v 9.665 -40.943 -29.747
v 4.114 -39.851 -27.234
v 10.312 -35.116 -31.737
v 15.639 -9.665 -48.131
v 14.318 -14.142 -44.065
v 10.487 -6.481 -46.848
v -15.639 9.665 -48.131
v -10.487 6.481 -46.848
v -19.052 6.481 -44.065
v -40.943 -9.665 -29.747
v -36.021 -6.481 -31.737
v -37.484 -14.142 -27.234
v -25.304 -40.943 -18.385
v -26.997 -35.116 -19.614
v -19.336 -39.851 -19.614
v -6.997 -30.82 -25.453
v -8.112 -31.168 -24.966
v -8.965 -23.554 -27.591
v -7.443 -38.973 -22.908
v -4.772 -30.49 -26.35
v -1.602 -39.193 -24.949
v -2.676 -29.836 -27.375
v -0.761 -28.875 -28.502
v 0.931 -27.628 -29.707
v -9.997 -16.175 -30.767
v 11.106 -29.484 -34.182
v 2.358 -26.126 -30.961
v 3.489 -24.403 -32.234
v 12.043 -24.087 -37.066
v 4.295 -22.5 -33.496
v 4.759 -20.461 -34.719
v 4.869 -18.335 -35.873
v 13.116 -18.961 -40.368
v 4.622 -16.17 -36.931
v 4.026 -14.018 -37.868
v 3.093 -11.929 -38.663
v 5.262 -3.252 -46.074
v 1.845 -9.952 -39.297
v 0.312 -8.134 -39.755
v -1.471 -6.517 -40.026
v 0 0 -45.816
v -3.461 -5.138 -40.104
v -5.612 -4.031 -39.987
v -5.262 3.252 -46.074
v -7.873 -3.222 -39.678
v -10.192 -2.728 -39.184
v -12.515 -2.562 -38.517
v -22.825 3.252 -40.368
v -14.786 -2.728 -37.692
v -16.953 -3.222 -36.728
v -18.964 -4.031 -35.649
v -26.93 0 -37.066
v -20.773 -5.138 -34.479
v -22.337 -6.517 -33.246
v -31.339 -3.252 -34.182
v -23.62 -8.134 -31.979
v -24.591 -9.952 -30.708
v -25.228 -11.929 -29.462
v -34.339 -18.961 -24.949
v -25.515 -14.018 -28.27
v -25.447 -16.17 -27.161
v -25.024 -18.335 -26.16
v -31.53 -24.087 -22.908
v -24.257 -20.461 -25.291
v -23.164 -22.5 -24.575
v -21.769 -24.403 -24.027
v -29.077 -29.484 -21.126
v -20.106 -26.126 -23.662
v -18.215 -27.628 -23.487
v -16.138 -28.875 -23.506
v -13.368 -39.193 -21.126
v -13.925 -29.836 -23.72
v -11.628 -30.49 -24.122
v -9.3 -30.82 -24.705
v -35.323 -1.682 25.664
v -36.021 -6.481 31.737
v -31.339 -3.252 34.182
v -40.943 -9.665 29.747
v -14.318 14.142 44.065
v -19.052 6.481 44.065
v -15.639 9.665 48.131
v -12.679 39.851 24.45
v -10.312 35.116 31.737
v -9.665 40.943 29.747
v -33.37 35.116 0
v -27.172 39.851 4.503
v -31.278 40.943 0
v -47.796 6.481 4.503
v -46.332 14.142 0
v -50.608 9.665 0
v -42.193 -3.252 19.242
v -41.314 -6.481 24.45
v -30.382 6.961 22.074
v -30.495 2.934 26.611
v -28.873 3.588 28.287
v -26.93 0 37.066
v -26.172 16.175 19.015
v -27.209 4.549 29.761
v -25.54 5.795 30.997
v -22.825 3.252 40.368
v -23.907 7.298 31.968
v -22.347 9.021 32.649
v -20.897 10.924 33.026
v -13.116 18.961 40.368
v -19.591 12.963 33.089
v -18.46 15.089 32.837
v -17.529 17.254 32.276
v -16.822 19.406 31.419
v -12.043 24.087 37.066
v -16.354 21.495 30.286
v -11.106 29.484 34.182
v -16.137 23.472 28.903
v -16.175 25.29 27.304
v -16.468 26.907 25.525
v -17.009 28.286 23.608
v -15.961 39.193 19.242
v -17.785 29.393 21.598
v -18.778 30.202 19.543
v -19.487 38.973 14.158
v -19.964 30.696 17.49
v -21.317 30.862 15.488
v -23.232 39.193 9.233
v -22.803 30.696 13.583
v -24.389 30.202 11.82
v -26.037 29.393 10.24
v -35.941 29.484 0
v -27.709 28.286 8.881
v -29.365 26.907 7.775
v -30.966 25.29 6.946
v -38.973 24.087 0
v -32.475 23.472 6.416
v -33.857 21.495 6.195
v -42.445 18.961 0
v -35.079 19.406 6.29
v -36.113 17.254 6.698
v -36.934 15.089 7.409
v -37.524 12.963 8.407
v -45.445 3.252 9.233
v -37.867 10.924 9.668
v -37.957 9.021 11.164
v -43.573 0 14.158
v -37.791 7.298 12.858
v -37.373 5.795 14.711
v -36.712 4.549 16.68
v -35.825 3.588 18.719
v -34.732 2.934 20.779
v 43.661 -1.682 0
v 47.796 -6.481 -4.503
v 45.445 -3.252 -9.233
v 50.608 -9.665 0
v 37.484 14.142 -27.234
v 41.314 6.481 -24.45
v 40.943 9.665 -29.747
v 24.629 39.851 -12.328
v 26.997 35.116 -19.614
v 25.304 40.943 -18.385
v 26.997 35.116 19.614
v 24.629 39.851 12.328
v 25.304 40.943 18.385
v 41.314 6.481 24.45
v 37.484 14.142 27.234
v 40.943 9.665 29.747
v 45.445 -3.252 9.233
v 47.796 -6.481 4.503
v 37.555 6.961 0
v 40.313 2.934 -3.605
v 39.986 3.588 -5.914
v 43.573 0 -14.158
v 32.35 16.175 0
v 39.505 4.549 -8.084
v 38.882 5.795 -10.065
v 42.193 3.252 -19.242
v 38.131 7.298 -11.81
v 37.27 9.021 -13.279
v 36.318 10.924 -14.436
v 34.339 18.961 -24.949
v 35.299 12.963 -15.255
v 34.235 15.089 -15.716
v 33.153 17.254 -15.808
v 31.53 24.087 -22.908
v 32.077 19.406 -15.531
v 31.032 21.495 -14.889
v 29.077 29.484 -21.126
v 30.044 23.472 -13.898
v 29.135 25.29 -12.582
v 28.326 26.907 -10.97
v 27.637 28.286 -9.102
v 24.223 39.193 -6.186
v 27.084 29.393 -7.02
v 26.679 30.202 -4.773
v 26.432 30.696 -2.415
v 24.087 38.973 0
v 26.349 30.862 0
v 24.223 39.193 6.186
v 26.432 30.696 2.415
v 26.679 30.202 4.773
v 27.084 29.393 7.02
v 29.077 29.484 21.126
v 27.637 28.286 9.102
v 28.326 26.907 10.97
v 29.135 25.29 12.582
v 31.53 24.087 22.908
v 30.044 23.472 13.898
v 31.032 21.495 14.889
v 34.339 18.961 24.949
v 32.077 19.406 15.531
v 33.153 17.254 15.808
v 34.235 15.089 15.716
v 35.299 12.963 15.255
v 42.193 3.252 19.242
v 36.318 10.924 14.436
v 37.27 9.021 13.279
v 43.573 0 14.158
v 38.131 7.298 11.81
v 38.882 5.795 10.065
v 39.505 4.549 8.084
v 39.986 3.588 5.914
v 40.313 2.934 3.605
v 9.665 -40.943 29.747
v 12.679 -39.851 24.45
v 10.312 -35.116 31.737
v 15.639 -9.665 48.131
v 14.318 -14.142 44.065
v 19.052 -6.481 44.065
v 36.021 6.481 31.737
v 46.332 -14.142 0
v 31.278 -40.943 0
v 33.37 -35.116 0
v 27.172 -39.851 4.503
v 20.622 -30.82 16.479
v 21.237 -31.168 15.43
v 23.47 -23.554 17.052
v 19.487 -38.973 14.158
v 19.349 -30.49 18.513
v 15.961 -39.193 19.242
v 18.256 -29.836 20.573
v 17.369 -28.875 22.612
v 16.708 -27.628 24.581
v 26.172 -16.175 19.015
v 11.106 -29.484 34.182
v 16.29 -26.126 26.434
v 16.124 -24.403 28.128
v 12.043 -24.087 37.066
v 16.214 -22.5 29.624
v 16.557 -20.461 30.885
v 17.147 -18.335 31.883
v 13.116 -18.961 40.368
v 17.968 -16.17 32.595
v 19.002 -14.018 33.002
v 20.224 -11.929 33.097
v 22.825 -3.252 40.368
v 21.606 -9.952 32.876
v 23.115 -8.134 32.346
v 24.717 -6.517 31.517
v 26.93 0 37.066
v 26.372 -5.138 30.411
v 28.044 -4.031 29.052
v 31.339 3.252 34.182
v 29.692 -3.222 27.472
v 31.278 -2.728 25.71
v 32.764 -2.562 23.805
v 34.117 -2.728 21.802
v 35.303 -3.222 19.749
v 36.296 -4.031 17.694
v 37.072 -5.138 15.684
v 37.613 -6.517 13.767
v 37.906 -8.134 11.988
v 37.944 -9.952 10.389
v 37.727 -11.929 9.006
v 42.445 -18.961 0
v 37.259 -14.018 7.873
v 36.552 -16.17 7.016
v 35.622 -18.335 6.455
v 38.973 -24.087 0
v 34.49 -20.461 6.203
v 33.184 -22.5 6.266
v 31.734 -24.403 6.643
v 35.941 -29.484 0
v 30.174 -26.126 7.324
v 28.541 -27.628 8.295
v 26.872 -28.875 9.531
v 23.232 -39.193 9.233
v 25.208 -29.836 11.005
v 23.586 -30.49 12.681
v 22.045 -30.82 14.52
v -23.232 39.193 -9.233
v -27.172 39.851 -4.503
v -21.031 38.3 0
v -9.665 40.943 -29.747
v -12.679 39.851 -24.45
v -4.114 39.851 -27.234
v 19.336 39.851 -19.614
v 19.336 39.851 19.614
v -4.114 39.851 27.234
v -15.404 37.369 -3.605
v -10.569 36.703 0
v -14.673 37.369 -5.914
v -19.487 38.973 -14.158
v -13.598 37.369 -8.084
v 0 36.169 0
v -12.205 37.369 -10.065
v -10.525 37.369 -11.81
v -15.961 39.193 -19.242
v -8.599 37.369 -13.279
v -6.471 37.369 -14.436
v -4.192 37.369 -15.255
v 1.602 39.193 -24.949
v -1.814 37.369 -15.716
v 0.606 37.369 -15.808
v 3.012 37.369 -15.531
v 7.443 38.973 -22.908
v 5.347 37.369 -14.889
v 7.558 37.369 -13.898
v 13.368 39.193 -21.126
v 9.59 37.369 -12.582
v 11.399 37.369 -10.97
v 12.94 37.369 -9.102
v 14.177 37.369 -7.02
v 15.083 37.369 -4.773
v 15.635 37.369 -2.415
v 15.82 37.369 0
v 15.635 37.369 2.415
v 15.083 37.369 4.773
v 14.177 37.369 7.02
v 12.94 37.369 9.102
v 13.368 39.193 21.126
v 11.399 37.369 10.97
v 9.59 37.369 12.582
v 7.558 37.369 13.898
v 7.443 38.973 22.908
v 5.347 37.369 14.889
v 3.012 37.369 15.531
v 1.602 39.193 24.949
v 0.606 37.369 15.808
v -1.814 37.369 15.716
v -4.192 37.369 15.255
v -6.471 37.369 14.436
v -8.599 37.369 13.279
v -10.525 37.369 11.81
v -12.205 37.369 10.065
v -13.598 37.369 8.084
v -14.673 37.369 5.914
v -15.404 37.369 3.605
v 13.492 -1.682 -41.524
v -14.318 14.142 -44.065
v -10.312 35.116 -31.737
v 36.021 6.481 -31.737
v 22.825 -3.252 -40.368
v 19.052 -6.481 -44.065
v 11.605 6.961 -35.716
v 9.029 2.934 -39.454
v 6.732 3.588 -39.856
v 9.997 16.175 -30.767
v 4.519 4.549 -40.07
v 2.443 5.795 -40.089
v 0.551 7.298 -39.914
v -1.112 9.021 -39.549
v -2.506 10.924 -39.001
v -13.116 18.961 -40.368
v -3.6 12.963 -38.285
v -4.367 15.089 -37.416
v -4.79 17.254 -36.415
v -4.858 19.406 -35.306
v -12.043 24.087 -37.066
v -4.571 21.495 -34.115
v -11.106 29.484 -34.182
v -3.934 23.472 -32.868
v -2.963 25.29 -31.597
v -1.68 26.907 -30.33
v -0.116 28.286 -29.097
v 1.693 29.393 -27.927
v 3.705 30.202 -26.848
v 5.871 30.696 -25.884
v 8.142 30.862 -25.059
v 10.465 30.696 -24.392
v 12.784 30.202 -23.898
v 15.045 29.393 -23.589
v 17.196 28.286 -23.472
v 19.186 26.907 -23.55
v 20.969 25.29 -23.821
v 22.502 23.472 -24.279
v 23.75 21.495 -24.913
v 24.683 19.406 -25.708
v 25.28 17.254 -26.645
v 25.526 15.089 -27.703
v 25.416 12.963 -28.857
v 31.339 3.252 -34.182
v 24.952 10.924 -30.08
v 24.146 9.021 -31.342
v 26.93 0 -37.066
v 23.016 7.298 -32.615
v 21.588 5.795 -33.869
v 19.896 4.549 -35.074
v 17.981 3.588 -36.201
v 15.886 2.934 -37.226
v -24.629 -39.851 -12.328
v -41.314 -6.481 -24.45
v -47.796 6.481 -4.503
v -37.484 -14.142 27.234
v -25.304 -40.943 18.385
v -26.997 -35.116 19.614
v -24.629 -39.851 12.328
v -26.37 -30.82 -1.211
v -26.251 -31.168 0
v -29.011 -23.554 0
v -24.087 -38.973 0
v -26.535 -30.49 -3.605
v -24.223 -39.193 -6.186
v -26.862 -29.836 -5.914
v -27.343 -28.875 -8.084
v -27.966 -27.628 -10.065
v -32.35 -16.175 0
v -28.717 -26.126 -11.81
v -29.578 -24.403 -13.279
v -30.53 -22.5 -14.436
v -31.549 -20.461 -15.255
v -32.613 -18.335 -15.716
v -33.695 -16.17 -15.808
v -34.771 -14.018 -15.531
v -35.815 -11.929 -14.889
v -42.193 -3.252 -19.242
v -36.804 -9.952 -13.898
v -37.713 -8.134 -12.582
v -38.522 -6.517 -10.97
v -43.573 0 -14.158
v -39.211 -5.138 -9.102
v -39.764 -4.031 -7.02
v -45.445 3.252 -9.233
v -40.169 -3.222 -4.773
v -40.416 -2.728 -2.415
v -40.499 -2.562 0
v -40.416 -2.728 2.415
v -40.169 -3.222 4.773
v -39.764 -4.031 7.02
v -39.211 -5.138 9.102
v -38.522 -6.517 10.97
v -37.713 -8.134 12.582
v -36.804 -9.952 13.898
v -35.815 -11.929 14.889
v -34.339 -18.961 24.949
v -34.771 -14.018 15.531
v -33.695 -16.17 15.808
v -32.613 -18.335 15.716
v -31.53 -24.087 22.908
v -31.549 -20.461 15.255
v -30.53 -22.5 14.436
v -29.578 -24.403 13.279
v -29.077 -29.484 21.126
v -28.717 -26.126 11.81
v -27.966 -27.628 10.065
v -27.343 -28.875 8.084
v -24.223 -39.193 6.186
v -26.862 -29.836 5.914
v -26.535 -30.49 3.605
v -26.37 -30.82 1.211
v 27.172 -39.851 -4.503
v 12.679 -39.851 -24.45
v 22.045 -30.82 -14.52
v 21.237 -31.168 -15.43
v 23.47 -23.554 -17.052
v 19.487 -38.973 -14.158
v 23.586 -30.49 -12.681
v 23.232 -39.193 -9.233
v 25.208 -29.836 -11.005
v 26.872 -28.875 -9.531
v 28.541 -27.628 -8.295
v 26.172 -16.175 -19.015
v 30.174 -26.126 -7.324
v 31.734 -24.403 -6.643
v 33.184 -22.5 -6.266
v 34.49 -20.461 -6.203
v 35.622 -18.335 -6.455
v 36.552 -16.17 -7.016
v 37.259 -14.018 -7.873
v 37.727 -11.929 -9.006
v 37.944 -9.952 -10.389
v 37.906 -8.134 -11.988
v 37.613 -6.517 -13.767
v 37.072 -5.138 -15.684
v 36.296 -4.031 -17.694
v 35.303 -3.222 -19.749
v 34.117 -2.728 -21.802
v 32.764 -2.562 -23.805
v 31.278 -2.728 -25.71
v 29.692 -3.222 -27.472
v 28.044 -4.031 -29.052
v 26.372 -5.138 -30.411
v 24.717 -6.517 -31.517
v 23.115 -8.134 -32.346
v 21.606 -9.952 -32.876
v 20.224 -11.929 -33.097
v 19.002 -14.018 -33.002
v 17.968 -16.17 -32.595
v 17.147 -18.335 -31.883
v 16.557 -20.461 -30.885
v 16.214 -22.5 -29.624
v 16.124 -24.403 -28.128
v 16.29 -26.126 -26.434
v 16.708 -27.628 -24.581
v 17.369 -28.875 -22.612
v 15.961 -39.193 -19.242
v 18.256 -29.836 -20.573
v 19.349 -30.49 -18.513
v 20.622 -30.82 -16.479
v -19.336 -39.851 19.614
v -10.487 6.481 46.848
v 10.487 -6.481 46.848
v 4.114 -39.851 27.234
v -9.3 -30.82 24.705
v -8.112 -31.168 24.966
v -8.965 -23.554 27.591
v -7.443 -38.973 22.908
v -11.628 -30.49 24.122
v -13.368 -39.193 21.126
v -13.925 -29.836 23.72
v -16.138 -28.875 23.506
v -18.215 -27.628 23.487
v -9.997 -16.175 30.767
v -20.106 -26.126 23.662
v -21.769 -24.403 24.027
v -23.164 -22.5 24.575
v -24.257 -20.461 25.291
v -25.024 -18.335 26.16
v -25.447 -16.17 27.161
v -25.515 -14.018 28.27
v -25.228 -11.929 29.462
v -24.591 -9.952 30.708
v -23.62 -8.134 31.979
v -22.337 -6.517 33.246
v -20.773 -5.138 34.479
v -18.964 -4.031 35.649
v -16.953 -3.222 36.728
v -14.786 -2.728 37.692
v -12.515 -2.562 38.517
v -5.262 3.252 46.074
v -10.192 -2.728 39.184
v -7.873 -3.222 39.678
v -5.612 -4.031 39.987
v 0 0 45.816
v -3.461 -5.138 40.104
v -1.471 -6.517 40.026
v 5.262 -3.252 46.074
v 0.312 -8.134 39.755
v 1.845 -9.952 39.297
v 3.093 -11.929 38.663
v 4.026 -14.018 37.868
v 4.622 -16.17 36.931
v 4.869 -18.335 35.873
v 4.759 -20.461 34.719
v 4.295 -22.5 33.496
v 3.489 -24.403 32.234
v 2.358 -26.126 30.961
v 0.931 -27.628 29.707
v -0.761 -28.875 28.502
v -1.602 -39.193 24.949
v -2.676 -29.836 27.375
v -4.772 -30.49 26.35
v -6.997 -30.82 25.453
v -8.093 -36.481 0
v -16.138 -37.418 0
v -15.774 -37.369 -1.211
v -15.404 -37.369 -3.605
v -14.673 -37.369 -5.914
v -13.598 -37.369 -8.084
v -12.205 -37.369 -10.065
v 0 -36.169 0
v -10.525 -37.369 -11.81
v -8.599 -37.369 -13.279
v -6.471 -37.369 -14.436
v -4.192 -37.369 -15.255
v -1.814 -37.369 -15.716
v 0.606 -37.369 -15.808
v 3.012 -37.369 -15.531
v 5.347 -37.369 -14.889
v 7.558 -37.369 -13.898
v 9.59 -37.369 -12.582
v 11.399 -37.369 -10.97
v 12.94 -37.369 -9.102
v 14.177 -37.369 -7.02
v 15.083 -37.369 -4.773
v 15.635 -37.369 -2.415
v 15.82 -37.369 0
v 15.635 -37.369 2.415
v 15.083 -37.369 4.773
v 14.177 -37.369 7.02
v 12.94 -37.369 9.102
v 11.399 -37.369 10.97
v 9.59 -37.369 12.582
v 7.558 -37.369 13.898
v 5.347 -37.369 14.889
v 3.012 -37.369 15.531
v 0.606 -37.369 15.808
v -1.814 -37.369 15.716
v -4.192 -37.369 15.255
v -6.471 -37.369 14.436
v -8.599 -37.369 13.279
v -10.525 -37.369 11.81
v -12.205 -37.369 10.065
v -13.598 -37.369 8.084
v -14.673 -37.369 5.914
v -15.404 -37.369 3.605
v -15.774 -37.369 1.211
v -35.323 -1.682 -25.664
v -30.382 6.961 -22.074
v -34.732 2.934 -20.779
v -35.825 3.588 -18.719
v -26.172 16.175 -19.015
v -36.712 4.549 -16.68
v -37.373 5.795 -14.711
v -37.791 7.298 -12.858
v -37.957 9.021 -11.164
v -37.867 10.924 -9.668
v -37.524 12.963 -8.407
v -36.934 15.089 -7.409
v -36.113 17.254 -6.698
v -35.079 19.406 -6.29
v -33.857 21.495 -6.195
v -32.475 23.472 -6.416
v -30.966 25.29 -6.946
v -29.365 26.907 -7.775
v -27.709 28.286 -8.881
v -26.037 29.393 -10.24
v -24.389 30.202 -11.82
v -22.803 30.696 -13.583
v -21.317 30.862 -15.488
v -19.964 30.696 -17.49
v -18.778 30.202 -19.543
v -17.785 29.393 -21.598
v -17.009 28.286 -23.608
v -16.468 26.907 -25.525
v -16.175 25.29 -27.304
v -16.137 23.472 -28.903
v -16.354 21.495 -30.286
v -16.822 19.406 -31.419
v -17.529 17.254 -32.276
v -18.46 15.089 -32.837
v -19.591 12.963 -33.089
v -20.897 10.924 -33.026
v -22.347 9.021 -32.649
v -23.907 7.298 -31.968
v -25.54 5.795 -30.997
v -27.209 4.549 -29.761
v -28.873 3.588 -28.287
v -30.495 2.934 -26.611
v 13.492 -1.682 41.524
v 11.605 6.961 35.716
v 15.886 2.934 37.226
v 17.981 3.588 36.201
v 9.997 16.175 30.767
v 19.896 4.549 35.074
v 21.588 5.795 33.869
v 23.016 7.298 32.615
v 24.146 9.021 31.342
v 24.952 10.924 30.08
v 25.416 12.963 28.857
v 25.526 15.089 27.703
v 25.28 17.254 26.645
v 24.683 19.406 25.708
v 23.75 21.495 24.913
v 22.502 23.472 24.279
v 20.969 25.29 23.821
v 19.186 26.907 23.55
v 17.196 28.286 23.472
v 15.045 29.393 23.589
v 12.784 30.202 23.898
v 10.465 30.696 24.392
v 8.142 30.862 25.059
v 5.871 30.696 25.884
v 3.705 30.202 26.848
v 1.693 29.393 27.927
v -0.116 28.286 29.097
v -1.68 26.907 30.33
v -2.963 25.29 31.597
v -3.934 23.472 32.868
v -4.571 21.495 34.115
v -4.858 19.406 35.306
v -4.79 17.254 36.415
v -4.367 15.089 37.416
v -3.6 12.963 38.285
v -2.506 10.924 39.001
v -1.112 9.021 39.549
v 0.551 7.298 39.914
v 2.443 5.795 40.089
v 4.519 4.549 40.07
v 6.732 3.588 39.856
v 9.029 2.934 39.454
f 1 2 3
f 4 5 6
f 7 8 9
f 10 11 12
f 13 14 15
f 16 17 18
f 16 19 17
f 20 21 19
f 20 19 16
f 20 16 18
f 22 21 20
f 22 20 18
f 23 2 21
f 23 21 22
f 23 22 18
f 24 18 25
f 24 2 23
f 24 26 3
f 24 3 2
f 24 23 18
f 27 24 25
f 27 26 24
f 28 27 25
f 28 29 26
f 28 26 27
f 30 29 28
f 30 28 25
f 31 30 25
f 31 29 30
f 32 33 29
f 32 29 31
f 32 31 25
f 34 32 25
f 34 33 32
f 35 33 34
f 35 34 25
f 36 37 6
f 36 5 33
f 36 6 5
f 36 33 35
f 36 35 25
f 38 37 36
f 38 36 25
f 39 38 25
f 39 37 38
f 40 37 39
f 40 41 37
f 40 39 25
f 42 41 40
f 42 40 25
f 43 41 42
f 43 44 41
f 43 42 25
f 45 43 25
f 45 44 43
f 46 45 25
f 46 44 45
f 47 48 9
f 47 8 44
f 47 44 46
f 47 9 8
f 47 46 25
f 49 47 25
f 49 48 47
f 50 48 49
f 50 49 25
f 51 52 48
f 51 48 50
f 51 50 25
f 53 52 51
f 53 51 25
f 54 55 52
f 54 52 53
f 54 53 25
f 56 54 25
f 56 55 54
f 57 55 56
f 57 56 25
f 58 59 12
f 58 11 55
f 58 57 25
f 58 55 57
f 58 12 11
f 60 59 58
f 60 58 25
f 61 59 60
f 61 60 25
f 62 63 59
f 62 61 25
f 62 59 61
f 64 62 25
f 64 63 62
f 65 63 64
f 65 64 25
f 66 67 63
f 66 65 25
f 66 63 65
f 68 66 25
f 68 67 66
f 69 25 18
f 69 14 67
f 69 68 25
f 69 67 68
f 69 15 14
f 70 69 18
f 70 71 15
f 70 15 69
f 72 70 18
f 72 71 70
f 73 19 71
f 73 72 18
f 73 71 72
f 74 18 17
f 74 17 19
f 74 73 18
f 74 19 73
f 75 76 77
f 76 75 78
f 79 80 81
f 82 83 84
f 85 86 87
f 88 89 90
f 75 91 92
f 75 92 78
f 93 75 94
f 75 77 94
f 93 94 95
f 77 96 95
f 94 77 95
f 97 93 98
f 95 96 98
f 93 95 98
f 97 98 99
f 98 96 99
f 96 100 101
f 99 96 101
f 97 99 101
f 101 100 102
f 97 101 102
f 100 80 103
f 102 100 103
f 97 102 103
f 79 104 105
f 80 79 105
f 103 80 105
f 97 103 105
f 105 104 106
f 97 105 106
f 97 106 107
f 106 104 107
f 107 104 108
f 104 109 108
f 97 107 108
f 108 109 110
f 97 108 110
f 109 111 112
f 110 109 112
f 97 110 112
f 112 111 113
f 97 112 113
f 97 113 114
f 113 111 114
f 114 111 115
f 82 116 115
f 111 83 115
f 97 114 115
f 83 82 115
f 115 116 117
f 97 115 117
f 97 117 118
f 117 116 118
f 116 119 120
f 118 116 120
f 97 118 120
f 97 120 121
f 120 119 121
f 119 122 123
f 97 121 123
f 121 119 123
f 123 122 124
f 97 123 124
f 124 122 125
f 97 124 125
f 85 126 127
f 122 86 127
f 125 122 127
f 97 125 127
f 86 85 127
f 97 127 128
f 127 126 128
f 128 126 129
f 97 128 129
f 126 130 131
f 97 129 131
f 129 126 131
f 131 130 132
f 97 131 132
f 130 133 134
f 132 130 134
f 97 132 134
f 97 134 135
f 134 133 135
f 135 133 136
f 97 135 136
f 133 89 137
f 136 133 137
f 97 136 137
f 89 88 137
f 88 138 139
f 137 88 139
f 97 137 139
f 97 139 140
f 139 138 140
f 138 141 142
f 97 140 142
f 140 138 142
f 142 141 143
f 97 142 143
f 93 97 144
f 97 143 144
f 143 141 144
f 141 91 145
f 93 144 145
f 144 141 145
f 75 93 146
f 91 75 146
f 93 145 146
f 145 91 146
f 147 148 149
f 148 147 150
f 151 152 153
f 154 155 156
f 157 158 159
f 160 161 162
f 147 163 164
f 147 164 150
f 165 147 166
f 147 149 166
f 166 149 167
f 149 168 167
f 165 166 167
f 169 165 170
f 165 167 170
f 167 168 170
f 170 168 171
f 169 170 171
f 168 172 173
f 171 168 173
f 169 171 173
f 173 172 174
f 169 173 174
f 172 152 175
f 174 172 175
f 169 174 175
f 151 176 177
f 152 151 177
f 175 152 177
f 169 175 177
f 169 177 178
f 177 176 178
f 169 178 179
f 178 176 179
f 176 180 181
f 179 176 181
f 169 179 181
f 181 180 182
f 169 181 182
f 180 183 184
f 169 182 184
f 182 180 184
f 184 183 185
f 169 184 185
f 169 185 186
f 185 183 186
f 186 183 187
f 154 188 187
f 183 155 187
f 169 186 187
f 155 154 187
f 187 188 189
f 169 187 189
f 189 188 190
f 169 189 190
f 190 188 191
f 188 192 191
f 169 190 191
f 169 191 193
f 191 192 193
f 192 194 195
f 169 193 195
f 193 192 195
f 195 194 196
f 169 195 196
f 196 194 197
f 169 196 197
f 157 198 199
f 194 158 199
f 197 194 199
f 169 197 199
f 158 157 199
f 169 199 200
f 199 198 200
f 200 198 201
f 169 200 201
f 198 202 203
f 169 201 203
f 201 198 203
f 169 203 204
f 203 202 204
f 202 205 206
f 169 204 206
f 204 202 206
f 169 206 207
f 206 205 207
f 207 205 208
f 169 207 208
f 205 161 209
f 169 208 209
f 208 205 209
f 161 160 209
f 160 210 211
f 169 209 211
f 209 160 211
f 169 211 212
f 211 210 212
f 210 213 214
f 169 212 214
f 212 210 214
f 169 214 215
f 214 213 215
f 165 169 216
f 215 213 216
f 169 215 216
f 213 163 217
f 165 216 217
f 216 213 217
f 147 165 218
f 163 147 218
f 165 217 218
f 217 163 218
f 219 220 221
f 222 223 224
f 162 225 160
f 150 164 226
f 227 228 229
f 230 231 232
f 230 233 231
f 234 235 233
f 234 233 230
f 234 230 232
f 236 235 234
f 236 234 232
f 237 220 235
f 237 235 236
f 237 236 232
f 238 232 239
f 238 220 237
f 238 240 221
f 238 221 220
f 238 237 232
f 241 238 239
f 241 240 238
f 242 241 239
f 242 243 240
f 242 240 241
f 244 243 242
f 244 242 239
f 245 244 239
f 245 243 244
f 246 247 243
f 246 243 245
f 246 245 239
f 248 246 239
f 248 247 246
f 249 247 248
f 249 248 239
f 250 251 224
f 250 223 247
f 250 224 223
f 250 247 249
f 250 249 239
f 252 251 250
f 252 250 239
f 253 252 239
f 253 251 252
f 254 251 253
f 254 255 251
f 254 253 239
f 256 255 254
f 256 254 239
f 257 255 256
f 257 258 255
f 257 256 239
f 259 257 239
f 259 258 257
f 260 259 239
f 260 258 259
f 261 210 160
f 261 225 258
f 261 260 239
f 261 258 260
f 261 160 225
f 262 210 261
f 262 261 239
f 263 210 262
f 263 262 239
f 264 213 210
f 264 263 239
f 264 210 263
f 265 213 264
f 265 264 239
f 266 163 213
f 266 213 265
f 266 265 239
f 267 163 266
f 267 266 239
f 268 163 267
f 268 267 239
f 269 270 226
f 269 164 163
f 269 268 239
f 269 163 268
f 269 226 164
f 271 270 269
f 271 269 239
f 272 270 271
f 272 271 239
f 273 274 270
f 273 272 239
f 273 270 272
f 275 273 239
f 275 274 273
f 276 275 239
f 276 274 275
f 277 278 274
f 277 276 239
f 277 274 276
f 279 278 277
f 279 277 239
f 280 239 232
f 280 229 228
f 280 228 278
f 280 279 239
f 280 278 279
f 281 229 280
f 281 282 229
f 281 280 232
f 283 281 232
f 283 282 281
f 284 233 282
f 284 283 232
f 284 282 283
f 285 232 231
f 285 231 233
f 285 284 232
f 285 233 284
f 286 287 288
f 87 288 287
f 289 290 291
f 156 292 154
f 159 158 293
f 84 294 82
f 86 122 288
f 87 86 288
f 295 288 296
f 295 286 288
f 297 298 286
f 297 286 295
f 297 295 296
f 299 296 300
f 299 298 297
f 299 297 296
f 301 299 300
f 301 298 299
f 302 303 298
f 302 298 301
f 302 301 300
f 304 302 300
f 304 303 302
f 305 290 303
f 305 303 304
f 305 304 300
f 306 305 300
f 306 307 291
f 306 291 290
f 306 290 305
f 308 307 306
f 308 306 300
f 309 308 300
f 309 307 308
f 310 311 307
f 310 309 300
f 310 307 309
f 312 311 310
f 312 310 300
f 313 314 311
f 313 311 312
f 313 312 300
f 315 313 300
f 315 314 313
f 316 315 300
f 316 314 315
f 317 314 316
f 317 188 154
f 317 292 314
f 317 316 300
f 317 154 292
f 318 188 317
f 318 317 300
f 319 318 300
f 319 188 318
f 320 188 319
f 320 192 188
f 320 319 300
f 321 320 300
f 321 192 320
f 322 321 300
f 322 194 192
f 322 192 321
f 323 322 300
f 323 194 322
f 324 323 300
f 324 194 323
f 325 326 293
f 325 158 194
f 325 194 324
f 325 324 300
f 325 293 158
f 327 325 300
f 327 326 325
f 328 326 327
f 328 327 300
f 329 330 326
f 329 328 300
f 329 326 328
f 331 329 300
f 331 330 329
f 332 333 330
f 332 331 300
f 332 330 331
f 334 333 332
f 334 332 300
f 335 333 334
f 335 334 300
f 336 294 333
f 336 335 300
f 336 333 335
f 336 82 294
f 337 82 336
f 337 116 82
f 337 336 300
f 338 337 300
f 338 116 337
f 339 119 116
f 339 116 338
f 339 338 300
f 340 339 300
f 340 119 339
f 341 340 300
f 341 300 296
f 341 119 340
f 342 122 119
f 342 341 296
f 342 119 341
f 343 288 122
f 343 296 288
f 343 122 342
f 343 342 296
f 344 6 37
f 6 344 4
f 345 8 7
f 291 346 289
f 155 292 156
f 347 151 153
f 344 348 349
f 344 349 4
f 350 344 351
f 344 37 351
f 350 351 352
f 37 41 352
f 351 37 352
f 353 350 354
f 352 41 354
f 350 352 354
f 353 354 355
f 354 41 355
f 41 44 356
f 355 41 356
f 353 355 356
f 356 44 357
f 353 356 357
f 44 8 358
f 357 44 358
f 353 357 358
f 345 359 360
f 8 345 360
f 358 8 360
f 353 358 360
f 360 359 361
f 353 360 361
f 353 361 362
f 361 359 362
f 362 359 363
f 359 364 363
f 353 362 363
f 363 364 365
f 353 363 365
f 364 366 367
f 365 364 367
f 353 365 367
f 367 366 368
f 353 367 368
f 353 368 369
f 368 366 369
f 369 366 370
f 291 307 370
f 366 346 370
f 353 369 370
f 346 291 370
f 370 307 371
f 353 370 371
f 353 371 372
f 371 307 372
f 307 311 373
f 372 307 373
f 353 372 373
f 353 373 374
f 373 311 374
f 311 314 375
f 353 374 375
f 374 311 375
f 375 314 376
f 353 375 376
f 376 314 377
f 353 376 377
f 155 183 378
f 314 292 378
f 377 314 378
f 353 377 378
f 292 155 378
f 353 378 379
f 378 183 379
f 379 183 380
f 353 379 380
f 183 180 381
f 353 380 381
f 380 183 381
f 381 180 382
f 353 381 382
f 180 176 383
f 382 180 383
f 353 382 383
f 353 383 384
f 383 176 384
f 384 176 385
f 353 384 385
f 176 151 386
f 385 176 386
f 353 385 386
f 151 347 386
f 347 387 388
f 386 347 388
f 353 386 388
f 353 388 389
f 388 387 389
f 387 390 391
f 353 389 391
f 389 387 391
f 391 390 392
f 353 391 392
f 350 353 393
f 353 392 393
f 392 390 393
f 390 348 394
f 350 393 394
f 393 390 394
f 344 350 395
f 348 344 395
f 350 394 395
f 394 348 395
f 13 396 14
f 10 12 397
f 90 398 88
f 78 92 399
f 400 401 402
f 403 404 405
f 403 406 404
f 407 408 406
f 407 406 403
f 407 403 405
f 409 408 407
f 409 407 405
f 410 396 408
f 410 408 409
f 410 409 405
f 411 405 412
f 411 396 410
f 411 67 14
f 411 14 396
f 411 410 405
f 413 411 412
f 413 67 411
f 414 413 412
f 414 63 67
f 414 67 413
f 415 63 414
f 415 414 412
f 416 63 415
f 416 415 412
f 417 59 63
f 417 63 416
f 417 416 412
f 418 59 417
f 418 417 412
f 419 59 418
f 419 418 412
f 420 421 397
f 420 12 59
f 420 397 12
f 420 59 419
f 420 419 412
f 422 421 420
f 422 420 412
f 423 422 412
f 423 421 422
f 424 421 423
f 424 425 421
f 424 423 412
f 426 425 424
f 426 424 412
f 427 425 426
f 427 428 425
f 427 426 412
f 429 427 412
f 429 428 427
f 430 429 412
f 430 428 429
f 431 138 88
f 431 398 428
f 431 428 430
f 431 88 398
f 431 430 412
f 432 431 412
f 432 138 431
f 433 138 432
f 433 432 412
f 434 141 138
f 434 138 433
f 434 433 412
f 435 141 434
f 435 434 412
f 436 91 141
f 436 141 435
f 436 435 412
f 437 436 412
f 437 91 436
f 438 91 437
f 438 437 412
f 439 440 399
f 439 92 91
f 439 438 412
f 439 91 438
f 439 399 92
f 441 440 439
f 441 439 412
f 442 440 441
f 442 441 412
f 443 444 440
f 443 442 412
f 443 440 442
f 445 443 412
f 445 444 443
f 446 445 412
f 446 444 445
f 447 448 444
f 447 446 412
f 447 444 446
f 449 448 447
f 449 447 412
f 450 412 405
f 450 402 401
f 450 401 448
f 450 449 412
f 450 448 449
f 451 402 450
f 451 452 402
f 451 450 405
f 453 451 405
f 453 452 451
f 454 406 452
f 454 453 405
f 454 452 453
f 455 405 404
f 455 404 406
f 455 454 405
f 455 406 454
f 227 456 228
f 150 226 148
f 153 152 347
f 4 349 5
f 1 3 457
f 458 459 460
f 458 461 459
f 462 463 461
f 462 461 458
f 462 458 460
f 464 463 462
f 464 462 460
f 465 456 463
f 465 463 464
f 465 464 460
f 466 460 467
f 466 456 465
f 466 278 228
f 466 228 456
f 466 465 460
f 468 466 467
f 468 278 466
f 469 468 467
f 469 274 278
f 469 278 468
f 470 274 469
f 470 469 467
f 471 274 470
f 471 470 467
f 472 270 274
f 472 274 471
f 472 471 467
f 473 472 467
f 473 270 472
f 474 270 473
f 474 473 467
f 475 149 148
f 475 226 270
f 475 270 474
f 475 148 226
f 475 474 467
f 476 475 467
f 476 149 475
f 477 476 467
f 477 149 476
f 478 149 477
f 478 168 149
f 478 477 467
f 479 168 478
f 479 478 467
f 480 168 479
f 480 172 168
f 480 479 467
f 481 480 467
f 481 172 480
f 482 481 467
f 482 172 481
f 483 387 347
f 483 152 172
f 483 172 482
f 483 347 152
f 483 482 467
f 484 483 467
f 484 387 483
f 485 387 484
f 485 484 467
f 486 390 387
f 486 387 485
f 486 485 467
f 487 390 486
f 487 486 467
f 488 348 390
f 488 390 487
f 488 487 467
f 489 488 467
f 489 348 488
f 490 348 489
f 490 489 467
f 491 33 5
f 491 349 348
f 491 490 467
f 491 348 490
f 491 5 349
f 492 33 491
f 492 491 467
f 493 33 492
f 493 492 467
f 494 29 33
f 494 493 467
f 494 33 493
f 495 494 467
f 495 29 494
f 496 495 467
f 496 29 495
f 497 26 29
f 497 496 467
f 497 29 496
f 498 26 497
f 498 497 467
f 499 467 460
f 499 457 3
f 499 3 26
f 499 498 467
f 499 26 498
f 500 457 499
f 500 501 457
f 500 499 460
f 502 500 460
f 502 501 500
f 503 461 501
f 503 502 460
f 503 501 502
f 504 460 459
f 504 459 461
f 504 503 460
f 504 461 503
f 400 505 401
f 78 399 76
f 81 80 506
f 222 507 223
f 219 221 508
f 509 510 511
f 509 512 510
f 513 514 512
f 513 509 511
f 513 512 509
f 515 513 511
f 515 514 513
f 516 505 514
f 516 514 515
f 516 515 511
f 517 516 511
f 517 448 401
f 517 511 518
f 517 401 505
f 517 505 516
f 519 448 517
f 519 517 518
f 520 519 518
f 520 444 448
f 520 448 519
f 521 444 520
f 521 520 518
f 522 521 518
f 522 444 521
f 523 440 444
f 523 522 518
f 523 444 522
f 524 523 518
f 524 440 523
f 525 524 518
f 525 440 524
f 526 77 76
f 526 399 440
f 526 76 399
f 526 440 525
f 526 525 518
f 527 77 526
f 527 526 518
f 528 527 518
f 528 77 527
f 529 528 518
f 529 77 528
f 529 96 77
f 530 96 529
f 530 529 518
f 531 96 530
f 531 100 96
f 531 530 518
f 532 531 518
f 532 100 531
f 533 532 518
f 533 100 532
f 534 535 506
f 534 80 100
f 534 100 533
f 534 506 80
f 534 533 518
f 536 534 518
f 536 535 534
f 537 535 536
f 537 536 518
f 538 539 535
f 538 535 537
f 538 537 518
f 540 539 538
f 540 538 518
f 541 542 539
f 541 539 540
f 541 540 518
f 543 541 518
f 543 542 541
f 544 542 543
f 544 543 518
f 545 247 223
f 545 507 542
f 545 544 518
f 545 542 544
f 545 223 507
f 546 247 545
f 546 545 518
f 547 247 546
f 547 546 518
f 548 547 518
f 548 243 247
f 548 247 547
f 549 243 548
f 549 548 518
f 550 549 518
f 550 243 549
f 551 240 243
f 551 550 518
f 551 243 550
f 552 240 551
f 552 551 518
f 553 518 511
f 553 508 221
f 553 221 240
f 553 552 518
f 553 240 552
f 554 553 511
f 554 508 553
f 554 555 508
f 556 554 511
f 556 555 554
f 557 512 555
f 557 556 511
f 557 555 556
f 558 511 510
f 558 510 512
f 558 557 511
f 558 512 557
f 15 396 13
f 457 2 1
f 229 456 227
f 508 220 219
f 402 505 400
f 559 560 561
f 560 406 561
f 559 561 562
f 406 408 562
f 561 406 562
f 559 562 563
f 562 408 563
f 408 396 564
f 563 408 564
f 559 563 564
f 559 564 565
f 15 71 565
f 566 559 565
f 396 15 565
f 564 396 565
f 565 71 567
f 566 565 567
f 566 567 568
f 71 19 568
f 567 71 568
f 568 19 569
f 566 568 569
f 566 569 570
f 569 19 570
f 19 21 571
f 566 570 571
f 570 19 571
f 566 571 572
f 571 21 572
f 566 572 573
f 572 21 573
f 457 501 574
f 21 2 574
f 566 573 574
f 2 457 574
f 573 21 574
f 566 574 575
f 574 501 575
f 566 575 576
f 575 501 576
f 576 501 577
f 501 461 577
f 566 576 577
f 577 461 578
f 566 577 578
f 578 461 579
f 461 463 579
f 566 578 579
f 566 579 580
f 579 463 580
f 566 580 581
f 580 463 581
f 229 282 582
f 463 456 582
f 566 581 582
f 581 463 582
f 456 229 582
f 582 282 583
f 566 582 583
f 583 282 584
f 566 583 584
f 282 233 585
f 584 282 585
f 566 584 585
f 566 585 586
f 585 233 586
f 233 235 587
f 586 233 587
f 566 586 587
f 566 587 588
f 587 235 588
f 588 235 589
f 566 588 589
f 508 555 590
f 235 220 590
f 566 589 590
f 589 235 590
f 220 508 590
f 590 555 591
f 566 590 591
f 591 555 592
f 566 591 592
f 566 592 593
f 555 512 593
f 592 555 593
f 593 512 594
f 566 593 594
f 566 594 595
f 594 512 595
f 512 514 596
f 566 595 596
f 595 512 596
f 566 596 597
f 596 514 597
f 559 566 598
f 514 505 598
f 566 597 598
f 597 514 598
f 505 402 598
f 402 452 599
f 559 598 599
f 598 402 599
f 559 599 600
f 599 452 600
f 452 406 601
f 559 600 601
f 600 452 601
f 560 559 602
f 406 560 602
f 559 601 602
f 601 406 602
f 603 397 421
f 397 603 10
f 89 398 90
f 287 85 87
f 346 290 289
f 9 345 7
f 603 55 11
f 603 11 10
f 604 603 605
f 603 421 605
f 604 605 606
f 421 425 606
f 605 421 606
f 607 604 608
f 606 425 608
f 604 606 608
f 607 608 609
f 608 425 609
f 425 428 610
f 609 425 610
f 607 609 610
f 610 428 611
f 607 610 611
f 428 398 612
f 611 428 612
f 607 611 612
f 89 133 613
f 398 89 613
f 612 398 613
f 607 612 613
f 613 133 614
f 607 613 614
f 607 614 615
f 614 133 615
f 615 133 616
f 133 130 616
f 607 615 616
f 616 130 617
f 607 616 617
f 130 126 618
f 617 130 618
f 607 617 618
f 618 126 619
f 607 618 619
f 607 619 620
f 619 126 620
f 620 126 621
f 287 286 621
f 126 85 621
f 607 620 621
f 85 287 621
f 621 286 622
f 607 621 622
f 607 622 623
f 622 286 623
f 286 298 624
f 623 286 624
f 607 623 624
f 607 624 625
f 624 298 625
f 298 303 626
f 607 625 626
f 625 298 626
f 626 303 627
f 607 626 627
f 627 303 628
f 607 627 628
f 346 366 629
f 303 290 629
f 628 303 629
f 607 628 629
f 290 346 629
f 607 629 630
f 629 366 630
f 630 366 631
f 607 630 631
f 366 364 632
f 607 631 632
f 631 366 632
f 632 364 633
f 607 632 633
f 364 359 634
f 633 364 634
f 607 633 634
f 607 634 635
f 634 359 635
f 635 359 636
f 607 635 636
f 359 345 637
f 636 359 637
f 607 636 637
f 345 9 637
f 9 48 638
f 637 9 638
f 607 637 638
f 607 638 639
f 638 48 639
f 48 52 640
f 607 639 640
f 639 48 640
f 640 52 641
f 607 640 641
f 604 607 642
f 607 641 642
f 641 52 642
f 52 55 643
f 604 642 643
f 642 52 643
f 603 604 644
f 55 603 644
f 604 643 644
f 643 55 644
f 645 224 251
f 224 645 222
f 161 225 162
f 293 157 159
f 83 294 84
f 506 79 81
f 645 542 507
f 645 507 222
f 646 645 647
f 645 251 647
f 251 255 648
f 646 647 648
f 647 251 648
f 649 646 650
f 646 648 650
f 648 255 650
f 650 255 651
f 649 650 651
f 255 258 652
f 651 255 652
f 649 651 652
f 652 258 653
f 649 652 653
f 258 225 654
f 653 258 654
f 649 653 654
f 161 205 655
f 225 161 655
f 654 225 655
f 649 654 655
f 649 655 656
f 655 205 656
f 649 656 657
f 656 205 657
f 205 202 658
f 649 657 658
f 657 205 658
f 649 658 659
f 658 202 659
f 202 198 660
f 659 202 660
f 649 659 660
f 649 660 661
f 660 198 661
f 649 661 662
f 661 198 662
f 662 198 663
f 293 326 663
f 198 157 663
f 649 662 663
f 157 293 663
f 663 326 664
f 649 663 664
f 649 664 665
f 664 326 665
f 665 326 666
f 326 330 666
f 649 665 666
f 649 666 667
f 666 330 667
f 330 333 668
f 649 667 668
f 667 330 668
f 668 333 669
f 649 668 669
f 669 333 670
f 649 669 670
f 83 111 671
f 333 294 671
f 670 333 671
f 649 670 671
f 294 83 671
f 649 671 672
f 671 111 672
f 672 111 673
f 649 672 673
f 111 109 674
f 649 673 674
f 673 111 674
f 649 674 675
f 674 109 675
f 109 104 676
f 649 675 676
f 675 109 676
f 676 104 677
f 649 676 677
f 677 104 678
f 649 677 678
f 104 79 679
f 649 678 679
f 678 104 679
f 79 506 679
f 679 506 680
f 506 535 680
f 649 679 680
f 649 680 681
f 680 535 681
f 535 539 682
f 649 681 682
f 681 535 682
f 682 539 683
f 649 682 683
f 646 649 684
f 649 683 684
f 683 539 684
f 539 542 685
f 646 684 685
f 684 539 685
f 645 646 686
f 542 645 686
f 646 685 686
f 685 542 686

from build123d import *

# Parameters (mm, degrees)
CIRPATTERN1_COUNT = 2
CIRPATTERN1_ANGLE = 116.565051177


with BuildPart() as part:
    # Sketch1 → Revolve1 (revolve)
    with BuildSketch(Plane(origin=(0, 0, 0), x_dir=(1, 0, 0), z_dir=(0, 1, 0))):
        with BuildLine():
            Line((0, -100), (0, 100))
            ThreePointArc((0, 100), (100, 0), (0, -100))
        make_face()
    revolve(axis=Axis((0, 0, 100), (0, 0, -1)))

    # Sketch2 → Cut-Revolve1 (revolve, cut)
    with BuildSketch(Plane.XY):
        with BuildLine():
            Line((0, 245.843235607), (0, 36.168568135))
            ThreePointArc((0, 36.168568135), (-104.837333736, 141.005901871), (0, 245.843235607))
        make_face()
    cut_revolve1 = revolve(axis=Axis((0, 245.843235607, 0), (0, -1, 0)), mode=Mode.SUBTRACT)

    # Mirror1: Cut-Revolve1 across plane
    add(cut_revolve1.mirror(Plane.ZX), mode=Mode.SUBTRACT)

    # CirPattern1: Cut-Revolve1 ×2 about axis
    cirpattern1_axis = Axis((0, 0, -110), (0, 0, 1))
    for i in range(1, CIRPATTERN1_COUNT):
        add(cut_revolve1.rotate(cirpattern1_axis, i * CIRPATTERN1_ANGLE / (CIRPATTERN1_COUNT - 1)), mode=Mode.SUBTRACT)

    # CirPattern1 copy 1 sketch → CirPattern1 copy 1 (revolve, cut)
    with BuildSketch(Plane(origin=(0, 0, 0), x_dir=(-0.44721359549996187, 0.8944271909999139, 0), z_dir=(0, 0, 1))):
        with BuildLine():
            Line((0, -245.843235607), (0, -36.168568135))
            ThreePointArc((0, -36.168568135), (-104.837333736, -141.005901871), (0, -245.843235607))
        make_face()
    revolve(axis=Axis((219.888874651, 109.944437325, 0), (0.894427190999914, 0.4472135954999616, 0)), mode=Mode.SUBTRACT)

    # CirPattern2 copy 1 sketch → CirPattern2 copy 1 (revolve, cut)
    with BuildSketch(Plane(origin=(0, 0, 0), x_dir=(-0.13819660112501175, 0.8944271909999139, -0.42532540417602366), z_dir=(-0.9510565162951535, 0, 0.30901699437494745))):
        with BuildLine():
            Line((0, 245.843235607), (0, 36.168568135))
            ThreePointArc((0, 36.168568135), (-104.837333736, 141.005901871), (0, 245.843235607))
        make_face()
    revolve(axis=Axis((-67.949399141, -109.944437325, -209.126747097), (0.2763932022500204, 0.44721359549996215, 0.8506508083520379)), mode=Mode.SUBTRACT)

    # CirPattern2 copy 2 sketch → CirPattern2 copy 2 (revolve, cut)
    with BuildSketch(Plane(origin=(0, 0, 0), x_dir=(0.36180339887499263, 0.8944271909999139, -0.2628655560595692), z_dir=(-0.5877852522924732, 0, -0.8090169943749473))):
        with BuildLine():
            Line((0, 245.843235607), (0, 36.168568135))
            ThreePointArc((0, 36.168568135), (-104.837333736, 141.005901871), (0, 245.843235607))
        make_face()
    revolve(axis=Axis((177.893836466, -109.944437325, -129.247437663), (-0.7236067977499772, 0.44721359549996215, 0.5257311121191324)), mode=Mode.SUBTRACT)

    # CirPattern2 copy 3 sketch → CirPattern2 copy 3 (revolve, cut)
    with BuildSketch(Plane(origin=(0, 0, 0), x_dir=(0.36180339887499274, 0.8944271909999137, 0.26286555605956907), z_dir=(0.587785252292473, 0, -0.8090169943749476))):
        with BuildLine():
            Line((0, 245.843235607), (0, 36.168568135))
            ThreePointArc((0, 36.168568135), (-104.837333736, 141.005901871), (0, 245.843235607))
        make_face()
    revolve(axis=Axis((177.893836466, -109.944437325, 129.247437663), (-0.7236067977499774, 0.4472135954999621, -0.5257311121191323)), mode=Mode.SUBTRACT)

    # CirPattern2 copy 4 sketch → CirPattern2 copy 4 (revolve, cut)
    with BuildSketch(Plane(origin=(0, 0, 0), x_dir=(-0.13819660112501164, 0.8944271909999139, 0.4253254041760237), z_dir=(0.9510565162951536, 0, 0.30901699437494723))):
        with BuildLine():
            Line((0, 245.843235607), (0, 36.168568135))
            ThreePointArc((0, 36.168568135), (-104.837333736, 141.005901871), (0, 245.843235607))
        make_face()
    revolve(axis=Axis((-67.949399141, -109.944437325, 209.126747097), (0.2763932022500202, 0.44721359549996215, -0.850650808352038)), mode=Mode.SUBTRACT)

    # CirPattern2 copy 5 sketch → CirPattern2 copy 5 (revolve, cut)
    with BuildSketch(Plane(origin=(0, 0, 0), x_dir=(-0.13819660112501175, 0.8944271909999139, -0.42532540417602366), z_dir=(-0.9510565162951535, 0, 0.30901699437494745))):
        with BuildLine():
            Line((0, -245.843235607), (0, -36.168568135))
            ThreePointArc((0, -36.168568135), (-104.837333736, -141.005901871), (0, -245.843235607))
        make_face()
    revolve(axis=Axis((67.949399141, 109.944437325, 209.126747097), (0.2763932022500205, 0.4472135954999616, 0.8506508083520381)), mode=Mode.SUBTRACT)

    # CirPattern2 copy 6 sketch → CirPattern2 copy 6 (revolve, cut)
    with BuildSketch(Plane(origin=(0, 0, 0), x_dir=(0.36180339887499263, 0.8944271909999139, -0.2628655560595692), z_dir=(-0.5877852522924732, 0, -0.8090169943749473))):
        with BuildLine():
            Line((0, -245.843235607), (0, -36.168568135))
            ThreePointArc((0, -36.168568135), (-104.837333736, -141.005901871), (0, -245.843235607))
        make_face()
    revolve(axis=Axis((-177.893836466, 109.944437325, 129.247437663), (-0.7236067977499774, 0.4472135954999616, 0.5257311121191326)), mode=Mode.SUBTRACT)

    # CirPattern2 copy 7 sketch → CirPattern2 copy 7 (revolve, cut)
    with BuildSketch(Plane(origin=(0, 0, 0), x_dir=(0.36180339887499274, 0.8944271909999137, 0.26286555605956907), z_dir=(0.587785252292473, 0, -0.8090169943749476))):
        with BuildLine():
            Line((0, -245.843235607), (0, -36.168568135))
            ThreePointArc((0, -36.168568135), (-104.837333736, -141.005901871), (0, -245.843235607))
        make_face()
    revolve(axis=Axis((-177.893836466, 109.944437325, -129.247437663), (-0.7236067977499776, 0.44721359549996154, -0.5257311121191325)), mode=Mode.SUBTRACT)

    # CirPattern2 copy 8 sketch → CirPattern2 copy 8 (revolve, cut)
    with BuildSketch(Plane(origin=(0, 0, 0), x_dir=(-0.13819660112501164, 0.8944271909999139, 0.4253254041760237), z_dir=(0.9510565162951536, 0, 0.30901699437494723))):
        with BuildLine():
            Line((0, -245.843235607), (0, -36.168568135))
            ThreePointArc((0, -36.168568135), (-104.837333736, -141.005901871), (0, -245.843235607))
        make_face()
    revolve(axis=Axis((67.949399141, 109.944437325, -209.126747097), (0.2763932022500203, 0.4472135954999616, -0.8506508083520382)), mode=Mode.SUBTRACT)

    # CirPattern2 copy 9 sketch → CirPattern2 copy 9 (revolve, cut)
    with BuildSketch(Plane(origin=(0, 0, 0), x_dir=(0.30901699437494745, 0, 0.9510565162951535), z_dir=(-0.9510565162951535, 0, 0.30901699437494745))):
        with BuildLine():
            Line((0, 245.843235607), (0, 36.168568135))
            ThreePointArc((0, 36.168568135), (-104.837333736, 141.005901871), (0, 245.843235607))
        make_face()
    revolve(axis=Axis((0, 245.843235607, 0), (0, -1, 0)), mode=Mode.SUBTRACT)

    # CirPattern2 copy 10 sketch → CirPattern2 copy 10 (revolve, cut)
    with BuildSketch(Plane(origin=(0, 0, 0), x_dir=(-0.8090169943749473, 0, 0.5877852522924732), z_dir=(-0.5877852522924732, 0, -0.8090169943749473))):
        with BuildLine():
            Line((0, 245.843235607), (0, 36.168568135))
            ThreePointArc((0, 36.168568135), (-104.837333736, 141.005901871), (0, 245.843235607))
        make_face()
    revolve(axis=Axis((0, 245.843235607, 0), (0, -1, 0)), mode=Mode.SUBTRACT)

    # CirPattern2 copy 11 sketch → CirPattern2 copy 11 (revolve, cut)
    with BuildSketch(Plane(origin=(0, 0, 0), x_dir=(-0.8090169943749476, 0, -0.587785252292473), z_dir=(0.587785252292473, 0, -0.8090169943749476))):
        with BuildLine():
            Line((0, 245.843235607), (0, 36.168568135))
            ThreePointArc((0, 36.168568135), (-104.837333736, 141.005901871), (0, 245.843235607))
        make_face()
    revolve(axis=Axis((0, 245.843235607, 0), (0, -1, 0)), mode=Mode.SUBTRACT)

    # CirPattern2 copy 12 sketch → CirPattern2 copy 12 (revolve, cut)
    with BuildSketch(Plane(origin=(0, 0, 0), x_dir=(0.30901699437494723, 0, -0.9510565162951536), z_dir=(0.9510565162951536, 0, 0.30901699437494723))):
        with BuildLine():
            Line((0, 245.843235607), (0, 36.168568135))
            ThreePointArc((0, 36.168568135), (-104.837333736, 141.005901871), (0, 245.843235607))
        make_face()
    revolve(axis=Axis((0, 245.843235607, 0), (0, -1, 0)), mode=Mode.SUBTRACT)


solid = part.part
